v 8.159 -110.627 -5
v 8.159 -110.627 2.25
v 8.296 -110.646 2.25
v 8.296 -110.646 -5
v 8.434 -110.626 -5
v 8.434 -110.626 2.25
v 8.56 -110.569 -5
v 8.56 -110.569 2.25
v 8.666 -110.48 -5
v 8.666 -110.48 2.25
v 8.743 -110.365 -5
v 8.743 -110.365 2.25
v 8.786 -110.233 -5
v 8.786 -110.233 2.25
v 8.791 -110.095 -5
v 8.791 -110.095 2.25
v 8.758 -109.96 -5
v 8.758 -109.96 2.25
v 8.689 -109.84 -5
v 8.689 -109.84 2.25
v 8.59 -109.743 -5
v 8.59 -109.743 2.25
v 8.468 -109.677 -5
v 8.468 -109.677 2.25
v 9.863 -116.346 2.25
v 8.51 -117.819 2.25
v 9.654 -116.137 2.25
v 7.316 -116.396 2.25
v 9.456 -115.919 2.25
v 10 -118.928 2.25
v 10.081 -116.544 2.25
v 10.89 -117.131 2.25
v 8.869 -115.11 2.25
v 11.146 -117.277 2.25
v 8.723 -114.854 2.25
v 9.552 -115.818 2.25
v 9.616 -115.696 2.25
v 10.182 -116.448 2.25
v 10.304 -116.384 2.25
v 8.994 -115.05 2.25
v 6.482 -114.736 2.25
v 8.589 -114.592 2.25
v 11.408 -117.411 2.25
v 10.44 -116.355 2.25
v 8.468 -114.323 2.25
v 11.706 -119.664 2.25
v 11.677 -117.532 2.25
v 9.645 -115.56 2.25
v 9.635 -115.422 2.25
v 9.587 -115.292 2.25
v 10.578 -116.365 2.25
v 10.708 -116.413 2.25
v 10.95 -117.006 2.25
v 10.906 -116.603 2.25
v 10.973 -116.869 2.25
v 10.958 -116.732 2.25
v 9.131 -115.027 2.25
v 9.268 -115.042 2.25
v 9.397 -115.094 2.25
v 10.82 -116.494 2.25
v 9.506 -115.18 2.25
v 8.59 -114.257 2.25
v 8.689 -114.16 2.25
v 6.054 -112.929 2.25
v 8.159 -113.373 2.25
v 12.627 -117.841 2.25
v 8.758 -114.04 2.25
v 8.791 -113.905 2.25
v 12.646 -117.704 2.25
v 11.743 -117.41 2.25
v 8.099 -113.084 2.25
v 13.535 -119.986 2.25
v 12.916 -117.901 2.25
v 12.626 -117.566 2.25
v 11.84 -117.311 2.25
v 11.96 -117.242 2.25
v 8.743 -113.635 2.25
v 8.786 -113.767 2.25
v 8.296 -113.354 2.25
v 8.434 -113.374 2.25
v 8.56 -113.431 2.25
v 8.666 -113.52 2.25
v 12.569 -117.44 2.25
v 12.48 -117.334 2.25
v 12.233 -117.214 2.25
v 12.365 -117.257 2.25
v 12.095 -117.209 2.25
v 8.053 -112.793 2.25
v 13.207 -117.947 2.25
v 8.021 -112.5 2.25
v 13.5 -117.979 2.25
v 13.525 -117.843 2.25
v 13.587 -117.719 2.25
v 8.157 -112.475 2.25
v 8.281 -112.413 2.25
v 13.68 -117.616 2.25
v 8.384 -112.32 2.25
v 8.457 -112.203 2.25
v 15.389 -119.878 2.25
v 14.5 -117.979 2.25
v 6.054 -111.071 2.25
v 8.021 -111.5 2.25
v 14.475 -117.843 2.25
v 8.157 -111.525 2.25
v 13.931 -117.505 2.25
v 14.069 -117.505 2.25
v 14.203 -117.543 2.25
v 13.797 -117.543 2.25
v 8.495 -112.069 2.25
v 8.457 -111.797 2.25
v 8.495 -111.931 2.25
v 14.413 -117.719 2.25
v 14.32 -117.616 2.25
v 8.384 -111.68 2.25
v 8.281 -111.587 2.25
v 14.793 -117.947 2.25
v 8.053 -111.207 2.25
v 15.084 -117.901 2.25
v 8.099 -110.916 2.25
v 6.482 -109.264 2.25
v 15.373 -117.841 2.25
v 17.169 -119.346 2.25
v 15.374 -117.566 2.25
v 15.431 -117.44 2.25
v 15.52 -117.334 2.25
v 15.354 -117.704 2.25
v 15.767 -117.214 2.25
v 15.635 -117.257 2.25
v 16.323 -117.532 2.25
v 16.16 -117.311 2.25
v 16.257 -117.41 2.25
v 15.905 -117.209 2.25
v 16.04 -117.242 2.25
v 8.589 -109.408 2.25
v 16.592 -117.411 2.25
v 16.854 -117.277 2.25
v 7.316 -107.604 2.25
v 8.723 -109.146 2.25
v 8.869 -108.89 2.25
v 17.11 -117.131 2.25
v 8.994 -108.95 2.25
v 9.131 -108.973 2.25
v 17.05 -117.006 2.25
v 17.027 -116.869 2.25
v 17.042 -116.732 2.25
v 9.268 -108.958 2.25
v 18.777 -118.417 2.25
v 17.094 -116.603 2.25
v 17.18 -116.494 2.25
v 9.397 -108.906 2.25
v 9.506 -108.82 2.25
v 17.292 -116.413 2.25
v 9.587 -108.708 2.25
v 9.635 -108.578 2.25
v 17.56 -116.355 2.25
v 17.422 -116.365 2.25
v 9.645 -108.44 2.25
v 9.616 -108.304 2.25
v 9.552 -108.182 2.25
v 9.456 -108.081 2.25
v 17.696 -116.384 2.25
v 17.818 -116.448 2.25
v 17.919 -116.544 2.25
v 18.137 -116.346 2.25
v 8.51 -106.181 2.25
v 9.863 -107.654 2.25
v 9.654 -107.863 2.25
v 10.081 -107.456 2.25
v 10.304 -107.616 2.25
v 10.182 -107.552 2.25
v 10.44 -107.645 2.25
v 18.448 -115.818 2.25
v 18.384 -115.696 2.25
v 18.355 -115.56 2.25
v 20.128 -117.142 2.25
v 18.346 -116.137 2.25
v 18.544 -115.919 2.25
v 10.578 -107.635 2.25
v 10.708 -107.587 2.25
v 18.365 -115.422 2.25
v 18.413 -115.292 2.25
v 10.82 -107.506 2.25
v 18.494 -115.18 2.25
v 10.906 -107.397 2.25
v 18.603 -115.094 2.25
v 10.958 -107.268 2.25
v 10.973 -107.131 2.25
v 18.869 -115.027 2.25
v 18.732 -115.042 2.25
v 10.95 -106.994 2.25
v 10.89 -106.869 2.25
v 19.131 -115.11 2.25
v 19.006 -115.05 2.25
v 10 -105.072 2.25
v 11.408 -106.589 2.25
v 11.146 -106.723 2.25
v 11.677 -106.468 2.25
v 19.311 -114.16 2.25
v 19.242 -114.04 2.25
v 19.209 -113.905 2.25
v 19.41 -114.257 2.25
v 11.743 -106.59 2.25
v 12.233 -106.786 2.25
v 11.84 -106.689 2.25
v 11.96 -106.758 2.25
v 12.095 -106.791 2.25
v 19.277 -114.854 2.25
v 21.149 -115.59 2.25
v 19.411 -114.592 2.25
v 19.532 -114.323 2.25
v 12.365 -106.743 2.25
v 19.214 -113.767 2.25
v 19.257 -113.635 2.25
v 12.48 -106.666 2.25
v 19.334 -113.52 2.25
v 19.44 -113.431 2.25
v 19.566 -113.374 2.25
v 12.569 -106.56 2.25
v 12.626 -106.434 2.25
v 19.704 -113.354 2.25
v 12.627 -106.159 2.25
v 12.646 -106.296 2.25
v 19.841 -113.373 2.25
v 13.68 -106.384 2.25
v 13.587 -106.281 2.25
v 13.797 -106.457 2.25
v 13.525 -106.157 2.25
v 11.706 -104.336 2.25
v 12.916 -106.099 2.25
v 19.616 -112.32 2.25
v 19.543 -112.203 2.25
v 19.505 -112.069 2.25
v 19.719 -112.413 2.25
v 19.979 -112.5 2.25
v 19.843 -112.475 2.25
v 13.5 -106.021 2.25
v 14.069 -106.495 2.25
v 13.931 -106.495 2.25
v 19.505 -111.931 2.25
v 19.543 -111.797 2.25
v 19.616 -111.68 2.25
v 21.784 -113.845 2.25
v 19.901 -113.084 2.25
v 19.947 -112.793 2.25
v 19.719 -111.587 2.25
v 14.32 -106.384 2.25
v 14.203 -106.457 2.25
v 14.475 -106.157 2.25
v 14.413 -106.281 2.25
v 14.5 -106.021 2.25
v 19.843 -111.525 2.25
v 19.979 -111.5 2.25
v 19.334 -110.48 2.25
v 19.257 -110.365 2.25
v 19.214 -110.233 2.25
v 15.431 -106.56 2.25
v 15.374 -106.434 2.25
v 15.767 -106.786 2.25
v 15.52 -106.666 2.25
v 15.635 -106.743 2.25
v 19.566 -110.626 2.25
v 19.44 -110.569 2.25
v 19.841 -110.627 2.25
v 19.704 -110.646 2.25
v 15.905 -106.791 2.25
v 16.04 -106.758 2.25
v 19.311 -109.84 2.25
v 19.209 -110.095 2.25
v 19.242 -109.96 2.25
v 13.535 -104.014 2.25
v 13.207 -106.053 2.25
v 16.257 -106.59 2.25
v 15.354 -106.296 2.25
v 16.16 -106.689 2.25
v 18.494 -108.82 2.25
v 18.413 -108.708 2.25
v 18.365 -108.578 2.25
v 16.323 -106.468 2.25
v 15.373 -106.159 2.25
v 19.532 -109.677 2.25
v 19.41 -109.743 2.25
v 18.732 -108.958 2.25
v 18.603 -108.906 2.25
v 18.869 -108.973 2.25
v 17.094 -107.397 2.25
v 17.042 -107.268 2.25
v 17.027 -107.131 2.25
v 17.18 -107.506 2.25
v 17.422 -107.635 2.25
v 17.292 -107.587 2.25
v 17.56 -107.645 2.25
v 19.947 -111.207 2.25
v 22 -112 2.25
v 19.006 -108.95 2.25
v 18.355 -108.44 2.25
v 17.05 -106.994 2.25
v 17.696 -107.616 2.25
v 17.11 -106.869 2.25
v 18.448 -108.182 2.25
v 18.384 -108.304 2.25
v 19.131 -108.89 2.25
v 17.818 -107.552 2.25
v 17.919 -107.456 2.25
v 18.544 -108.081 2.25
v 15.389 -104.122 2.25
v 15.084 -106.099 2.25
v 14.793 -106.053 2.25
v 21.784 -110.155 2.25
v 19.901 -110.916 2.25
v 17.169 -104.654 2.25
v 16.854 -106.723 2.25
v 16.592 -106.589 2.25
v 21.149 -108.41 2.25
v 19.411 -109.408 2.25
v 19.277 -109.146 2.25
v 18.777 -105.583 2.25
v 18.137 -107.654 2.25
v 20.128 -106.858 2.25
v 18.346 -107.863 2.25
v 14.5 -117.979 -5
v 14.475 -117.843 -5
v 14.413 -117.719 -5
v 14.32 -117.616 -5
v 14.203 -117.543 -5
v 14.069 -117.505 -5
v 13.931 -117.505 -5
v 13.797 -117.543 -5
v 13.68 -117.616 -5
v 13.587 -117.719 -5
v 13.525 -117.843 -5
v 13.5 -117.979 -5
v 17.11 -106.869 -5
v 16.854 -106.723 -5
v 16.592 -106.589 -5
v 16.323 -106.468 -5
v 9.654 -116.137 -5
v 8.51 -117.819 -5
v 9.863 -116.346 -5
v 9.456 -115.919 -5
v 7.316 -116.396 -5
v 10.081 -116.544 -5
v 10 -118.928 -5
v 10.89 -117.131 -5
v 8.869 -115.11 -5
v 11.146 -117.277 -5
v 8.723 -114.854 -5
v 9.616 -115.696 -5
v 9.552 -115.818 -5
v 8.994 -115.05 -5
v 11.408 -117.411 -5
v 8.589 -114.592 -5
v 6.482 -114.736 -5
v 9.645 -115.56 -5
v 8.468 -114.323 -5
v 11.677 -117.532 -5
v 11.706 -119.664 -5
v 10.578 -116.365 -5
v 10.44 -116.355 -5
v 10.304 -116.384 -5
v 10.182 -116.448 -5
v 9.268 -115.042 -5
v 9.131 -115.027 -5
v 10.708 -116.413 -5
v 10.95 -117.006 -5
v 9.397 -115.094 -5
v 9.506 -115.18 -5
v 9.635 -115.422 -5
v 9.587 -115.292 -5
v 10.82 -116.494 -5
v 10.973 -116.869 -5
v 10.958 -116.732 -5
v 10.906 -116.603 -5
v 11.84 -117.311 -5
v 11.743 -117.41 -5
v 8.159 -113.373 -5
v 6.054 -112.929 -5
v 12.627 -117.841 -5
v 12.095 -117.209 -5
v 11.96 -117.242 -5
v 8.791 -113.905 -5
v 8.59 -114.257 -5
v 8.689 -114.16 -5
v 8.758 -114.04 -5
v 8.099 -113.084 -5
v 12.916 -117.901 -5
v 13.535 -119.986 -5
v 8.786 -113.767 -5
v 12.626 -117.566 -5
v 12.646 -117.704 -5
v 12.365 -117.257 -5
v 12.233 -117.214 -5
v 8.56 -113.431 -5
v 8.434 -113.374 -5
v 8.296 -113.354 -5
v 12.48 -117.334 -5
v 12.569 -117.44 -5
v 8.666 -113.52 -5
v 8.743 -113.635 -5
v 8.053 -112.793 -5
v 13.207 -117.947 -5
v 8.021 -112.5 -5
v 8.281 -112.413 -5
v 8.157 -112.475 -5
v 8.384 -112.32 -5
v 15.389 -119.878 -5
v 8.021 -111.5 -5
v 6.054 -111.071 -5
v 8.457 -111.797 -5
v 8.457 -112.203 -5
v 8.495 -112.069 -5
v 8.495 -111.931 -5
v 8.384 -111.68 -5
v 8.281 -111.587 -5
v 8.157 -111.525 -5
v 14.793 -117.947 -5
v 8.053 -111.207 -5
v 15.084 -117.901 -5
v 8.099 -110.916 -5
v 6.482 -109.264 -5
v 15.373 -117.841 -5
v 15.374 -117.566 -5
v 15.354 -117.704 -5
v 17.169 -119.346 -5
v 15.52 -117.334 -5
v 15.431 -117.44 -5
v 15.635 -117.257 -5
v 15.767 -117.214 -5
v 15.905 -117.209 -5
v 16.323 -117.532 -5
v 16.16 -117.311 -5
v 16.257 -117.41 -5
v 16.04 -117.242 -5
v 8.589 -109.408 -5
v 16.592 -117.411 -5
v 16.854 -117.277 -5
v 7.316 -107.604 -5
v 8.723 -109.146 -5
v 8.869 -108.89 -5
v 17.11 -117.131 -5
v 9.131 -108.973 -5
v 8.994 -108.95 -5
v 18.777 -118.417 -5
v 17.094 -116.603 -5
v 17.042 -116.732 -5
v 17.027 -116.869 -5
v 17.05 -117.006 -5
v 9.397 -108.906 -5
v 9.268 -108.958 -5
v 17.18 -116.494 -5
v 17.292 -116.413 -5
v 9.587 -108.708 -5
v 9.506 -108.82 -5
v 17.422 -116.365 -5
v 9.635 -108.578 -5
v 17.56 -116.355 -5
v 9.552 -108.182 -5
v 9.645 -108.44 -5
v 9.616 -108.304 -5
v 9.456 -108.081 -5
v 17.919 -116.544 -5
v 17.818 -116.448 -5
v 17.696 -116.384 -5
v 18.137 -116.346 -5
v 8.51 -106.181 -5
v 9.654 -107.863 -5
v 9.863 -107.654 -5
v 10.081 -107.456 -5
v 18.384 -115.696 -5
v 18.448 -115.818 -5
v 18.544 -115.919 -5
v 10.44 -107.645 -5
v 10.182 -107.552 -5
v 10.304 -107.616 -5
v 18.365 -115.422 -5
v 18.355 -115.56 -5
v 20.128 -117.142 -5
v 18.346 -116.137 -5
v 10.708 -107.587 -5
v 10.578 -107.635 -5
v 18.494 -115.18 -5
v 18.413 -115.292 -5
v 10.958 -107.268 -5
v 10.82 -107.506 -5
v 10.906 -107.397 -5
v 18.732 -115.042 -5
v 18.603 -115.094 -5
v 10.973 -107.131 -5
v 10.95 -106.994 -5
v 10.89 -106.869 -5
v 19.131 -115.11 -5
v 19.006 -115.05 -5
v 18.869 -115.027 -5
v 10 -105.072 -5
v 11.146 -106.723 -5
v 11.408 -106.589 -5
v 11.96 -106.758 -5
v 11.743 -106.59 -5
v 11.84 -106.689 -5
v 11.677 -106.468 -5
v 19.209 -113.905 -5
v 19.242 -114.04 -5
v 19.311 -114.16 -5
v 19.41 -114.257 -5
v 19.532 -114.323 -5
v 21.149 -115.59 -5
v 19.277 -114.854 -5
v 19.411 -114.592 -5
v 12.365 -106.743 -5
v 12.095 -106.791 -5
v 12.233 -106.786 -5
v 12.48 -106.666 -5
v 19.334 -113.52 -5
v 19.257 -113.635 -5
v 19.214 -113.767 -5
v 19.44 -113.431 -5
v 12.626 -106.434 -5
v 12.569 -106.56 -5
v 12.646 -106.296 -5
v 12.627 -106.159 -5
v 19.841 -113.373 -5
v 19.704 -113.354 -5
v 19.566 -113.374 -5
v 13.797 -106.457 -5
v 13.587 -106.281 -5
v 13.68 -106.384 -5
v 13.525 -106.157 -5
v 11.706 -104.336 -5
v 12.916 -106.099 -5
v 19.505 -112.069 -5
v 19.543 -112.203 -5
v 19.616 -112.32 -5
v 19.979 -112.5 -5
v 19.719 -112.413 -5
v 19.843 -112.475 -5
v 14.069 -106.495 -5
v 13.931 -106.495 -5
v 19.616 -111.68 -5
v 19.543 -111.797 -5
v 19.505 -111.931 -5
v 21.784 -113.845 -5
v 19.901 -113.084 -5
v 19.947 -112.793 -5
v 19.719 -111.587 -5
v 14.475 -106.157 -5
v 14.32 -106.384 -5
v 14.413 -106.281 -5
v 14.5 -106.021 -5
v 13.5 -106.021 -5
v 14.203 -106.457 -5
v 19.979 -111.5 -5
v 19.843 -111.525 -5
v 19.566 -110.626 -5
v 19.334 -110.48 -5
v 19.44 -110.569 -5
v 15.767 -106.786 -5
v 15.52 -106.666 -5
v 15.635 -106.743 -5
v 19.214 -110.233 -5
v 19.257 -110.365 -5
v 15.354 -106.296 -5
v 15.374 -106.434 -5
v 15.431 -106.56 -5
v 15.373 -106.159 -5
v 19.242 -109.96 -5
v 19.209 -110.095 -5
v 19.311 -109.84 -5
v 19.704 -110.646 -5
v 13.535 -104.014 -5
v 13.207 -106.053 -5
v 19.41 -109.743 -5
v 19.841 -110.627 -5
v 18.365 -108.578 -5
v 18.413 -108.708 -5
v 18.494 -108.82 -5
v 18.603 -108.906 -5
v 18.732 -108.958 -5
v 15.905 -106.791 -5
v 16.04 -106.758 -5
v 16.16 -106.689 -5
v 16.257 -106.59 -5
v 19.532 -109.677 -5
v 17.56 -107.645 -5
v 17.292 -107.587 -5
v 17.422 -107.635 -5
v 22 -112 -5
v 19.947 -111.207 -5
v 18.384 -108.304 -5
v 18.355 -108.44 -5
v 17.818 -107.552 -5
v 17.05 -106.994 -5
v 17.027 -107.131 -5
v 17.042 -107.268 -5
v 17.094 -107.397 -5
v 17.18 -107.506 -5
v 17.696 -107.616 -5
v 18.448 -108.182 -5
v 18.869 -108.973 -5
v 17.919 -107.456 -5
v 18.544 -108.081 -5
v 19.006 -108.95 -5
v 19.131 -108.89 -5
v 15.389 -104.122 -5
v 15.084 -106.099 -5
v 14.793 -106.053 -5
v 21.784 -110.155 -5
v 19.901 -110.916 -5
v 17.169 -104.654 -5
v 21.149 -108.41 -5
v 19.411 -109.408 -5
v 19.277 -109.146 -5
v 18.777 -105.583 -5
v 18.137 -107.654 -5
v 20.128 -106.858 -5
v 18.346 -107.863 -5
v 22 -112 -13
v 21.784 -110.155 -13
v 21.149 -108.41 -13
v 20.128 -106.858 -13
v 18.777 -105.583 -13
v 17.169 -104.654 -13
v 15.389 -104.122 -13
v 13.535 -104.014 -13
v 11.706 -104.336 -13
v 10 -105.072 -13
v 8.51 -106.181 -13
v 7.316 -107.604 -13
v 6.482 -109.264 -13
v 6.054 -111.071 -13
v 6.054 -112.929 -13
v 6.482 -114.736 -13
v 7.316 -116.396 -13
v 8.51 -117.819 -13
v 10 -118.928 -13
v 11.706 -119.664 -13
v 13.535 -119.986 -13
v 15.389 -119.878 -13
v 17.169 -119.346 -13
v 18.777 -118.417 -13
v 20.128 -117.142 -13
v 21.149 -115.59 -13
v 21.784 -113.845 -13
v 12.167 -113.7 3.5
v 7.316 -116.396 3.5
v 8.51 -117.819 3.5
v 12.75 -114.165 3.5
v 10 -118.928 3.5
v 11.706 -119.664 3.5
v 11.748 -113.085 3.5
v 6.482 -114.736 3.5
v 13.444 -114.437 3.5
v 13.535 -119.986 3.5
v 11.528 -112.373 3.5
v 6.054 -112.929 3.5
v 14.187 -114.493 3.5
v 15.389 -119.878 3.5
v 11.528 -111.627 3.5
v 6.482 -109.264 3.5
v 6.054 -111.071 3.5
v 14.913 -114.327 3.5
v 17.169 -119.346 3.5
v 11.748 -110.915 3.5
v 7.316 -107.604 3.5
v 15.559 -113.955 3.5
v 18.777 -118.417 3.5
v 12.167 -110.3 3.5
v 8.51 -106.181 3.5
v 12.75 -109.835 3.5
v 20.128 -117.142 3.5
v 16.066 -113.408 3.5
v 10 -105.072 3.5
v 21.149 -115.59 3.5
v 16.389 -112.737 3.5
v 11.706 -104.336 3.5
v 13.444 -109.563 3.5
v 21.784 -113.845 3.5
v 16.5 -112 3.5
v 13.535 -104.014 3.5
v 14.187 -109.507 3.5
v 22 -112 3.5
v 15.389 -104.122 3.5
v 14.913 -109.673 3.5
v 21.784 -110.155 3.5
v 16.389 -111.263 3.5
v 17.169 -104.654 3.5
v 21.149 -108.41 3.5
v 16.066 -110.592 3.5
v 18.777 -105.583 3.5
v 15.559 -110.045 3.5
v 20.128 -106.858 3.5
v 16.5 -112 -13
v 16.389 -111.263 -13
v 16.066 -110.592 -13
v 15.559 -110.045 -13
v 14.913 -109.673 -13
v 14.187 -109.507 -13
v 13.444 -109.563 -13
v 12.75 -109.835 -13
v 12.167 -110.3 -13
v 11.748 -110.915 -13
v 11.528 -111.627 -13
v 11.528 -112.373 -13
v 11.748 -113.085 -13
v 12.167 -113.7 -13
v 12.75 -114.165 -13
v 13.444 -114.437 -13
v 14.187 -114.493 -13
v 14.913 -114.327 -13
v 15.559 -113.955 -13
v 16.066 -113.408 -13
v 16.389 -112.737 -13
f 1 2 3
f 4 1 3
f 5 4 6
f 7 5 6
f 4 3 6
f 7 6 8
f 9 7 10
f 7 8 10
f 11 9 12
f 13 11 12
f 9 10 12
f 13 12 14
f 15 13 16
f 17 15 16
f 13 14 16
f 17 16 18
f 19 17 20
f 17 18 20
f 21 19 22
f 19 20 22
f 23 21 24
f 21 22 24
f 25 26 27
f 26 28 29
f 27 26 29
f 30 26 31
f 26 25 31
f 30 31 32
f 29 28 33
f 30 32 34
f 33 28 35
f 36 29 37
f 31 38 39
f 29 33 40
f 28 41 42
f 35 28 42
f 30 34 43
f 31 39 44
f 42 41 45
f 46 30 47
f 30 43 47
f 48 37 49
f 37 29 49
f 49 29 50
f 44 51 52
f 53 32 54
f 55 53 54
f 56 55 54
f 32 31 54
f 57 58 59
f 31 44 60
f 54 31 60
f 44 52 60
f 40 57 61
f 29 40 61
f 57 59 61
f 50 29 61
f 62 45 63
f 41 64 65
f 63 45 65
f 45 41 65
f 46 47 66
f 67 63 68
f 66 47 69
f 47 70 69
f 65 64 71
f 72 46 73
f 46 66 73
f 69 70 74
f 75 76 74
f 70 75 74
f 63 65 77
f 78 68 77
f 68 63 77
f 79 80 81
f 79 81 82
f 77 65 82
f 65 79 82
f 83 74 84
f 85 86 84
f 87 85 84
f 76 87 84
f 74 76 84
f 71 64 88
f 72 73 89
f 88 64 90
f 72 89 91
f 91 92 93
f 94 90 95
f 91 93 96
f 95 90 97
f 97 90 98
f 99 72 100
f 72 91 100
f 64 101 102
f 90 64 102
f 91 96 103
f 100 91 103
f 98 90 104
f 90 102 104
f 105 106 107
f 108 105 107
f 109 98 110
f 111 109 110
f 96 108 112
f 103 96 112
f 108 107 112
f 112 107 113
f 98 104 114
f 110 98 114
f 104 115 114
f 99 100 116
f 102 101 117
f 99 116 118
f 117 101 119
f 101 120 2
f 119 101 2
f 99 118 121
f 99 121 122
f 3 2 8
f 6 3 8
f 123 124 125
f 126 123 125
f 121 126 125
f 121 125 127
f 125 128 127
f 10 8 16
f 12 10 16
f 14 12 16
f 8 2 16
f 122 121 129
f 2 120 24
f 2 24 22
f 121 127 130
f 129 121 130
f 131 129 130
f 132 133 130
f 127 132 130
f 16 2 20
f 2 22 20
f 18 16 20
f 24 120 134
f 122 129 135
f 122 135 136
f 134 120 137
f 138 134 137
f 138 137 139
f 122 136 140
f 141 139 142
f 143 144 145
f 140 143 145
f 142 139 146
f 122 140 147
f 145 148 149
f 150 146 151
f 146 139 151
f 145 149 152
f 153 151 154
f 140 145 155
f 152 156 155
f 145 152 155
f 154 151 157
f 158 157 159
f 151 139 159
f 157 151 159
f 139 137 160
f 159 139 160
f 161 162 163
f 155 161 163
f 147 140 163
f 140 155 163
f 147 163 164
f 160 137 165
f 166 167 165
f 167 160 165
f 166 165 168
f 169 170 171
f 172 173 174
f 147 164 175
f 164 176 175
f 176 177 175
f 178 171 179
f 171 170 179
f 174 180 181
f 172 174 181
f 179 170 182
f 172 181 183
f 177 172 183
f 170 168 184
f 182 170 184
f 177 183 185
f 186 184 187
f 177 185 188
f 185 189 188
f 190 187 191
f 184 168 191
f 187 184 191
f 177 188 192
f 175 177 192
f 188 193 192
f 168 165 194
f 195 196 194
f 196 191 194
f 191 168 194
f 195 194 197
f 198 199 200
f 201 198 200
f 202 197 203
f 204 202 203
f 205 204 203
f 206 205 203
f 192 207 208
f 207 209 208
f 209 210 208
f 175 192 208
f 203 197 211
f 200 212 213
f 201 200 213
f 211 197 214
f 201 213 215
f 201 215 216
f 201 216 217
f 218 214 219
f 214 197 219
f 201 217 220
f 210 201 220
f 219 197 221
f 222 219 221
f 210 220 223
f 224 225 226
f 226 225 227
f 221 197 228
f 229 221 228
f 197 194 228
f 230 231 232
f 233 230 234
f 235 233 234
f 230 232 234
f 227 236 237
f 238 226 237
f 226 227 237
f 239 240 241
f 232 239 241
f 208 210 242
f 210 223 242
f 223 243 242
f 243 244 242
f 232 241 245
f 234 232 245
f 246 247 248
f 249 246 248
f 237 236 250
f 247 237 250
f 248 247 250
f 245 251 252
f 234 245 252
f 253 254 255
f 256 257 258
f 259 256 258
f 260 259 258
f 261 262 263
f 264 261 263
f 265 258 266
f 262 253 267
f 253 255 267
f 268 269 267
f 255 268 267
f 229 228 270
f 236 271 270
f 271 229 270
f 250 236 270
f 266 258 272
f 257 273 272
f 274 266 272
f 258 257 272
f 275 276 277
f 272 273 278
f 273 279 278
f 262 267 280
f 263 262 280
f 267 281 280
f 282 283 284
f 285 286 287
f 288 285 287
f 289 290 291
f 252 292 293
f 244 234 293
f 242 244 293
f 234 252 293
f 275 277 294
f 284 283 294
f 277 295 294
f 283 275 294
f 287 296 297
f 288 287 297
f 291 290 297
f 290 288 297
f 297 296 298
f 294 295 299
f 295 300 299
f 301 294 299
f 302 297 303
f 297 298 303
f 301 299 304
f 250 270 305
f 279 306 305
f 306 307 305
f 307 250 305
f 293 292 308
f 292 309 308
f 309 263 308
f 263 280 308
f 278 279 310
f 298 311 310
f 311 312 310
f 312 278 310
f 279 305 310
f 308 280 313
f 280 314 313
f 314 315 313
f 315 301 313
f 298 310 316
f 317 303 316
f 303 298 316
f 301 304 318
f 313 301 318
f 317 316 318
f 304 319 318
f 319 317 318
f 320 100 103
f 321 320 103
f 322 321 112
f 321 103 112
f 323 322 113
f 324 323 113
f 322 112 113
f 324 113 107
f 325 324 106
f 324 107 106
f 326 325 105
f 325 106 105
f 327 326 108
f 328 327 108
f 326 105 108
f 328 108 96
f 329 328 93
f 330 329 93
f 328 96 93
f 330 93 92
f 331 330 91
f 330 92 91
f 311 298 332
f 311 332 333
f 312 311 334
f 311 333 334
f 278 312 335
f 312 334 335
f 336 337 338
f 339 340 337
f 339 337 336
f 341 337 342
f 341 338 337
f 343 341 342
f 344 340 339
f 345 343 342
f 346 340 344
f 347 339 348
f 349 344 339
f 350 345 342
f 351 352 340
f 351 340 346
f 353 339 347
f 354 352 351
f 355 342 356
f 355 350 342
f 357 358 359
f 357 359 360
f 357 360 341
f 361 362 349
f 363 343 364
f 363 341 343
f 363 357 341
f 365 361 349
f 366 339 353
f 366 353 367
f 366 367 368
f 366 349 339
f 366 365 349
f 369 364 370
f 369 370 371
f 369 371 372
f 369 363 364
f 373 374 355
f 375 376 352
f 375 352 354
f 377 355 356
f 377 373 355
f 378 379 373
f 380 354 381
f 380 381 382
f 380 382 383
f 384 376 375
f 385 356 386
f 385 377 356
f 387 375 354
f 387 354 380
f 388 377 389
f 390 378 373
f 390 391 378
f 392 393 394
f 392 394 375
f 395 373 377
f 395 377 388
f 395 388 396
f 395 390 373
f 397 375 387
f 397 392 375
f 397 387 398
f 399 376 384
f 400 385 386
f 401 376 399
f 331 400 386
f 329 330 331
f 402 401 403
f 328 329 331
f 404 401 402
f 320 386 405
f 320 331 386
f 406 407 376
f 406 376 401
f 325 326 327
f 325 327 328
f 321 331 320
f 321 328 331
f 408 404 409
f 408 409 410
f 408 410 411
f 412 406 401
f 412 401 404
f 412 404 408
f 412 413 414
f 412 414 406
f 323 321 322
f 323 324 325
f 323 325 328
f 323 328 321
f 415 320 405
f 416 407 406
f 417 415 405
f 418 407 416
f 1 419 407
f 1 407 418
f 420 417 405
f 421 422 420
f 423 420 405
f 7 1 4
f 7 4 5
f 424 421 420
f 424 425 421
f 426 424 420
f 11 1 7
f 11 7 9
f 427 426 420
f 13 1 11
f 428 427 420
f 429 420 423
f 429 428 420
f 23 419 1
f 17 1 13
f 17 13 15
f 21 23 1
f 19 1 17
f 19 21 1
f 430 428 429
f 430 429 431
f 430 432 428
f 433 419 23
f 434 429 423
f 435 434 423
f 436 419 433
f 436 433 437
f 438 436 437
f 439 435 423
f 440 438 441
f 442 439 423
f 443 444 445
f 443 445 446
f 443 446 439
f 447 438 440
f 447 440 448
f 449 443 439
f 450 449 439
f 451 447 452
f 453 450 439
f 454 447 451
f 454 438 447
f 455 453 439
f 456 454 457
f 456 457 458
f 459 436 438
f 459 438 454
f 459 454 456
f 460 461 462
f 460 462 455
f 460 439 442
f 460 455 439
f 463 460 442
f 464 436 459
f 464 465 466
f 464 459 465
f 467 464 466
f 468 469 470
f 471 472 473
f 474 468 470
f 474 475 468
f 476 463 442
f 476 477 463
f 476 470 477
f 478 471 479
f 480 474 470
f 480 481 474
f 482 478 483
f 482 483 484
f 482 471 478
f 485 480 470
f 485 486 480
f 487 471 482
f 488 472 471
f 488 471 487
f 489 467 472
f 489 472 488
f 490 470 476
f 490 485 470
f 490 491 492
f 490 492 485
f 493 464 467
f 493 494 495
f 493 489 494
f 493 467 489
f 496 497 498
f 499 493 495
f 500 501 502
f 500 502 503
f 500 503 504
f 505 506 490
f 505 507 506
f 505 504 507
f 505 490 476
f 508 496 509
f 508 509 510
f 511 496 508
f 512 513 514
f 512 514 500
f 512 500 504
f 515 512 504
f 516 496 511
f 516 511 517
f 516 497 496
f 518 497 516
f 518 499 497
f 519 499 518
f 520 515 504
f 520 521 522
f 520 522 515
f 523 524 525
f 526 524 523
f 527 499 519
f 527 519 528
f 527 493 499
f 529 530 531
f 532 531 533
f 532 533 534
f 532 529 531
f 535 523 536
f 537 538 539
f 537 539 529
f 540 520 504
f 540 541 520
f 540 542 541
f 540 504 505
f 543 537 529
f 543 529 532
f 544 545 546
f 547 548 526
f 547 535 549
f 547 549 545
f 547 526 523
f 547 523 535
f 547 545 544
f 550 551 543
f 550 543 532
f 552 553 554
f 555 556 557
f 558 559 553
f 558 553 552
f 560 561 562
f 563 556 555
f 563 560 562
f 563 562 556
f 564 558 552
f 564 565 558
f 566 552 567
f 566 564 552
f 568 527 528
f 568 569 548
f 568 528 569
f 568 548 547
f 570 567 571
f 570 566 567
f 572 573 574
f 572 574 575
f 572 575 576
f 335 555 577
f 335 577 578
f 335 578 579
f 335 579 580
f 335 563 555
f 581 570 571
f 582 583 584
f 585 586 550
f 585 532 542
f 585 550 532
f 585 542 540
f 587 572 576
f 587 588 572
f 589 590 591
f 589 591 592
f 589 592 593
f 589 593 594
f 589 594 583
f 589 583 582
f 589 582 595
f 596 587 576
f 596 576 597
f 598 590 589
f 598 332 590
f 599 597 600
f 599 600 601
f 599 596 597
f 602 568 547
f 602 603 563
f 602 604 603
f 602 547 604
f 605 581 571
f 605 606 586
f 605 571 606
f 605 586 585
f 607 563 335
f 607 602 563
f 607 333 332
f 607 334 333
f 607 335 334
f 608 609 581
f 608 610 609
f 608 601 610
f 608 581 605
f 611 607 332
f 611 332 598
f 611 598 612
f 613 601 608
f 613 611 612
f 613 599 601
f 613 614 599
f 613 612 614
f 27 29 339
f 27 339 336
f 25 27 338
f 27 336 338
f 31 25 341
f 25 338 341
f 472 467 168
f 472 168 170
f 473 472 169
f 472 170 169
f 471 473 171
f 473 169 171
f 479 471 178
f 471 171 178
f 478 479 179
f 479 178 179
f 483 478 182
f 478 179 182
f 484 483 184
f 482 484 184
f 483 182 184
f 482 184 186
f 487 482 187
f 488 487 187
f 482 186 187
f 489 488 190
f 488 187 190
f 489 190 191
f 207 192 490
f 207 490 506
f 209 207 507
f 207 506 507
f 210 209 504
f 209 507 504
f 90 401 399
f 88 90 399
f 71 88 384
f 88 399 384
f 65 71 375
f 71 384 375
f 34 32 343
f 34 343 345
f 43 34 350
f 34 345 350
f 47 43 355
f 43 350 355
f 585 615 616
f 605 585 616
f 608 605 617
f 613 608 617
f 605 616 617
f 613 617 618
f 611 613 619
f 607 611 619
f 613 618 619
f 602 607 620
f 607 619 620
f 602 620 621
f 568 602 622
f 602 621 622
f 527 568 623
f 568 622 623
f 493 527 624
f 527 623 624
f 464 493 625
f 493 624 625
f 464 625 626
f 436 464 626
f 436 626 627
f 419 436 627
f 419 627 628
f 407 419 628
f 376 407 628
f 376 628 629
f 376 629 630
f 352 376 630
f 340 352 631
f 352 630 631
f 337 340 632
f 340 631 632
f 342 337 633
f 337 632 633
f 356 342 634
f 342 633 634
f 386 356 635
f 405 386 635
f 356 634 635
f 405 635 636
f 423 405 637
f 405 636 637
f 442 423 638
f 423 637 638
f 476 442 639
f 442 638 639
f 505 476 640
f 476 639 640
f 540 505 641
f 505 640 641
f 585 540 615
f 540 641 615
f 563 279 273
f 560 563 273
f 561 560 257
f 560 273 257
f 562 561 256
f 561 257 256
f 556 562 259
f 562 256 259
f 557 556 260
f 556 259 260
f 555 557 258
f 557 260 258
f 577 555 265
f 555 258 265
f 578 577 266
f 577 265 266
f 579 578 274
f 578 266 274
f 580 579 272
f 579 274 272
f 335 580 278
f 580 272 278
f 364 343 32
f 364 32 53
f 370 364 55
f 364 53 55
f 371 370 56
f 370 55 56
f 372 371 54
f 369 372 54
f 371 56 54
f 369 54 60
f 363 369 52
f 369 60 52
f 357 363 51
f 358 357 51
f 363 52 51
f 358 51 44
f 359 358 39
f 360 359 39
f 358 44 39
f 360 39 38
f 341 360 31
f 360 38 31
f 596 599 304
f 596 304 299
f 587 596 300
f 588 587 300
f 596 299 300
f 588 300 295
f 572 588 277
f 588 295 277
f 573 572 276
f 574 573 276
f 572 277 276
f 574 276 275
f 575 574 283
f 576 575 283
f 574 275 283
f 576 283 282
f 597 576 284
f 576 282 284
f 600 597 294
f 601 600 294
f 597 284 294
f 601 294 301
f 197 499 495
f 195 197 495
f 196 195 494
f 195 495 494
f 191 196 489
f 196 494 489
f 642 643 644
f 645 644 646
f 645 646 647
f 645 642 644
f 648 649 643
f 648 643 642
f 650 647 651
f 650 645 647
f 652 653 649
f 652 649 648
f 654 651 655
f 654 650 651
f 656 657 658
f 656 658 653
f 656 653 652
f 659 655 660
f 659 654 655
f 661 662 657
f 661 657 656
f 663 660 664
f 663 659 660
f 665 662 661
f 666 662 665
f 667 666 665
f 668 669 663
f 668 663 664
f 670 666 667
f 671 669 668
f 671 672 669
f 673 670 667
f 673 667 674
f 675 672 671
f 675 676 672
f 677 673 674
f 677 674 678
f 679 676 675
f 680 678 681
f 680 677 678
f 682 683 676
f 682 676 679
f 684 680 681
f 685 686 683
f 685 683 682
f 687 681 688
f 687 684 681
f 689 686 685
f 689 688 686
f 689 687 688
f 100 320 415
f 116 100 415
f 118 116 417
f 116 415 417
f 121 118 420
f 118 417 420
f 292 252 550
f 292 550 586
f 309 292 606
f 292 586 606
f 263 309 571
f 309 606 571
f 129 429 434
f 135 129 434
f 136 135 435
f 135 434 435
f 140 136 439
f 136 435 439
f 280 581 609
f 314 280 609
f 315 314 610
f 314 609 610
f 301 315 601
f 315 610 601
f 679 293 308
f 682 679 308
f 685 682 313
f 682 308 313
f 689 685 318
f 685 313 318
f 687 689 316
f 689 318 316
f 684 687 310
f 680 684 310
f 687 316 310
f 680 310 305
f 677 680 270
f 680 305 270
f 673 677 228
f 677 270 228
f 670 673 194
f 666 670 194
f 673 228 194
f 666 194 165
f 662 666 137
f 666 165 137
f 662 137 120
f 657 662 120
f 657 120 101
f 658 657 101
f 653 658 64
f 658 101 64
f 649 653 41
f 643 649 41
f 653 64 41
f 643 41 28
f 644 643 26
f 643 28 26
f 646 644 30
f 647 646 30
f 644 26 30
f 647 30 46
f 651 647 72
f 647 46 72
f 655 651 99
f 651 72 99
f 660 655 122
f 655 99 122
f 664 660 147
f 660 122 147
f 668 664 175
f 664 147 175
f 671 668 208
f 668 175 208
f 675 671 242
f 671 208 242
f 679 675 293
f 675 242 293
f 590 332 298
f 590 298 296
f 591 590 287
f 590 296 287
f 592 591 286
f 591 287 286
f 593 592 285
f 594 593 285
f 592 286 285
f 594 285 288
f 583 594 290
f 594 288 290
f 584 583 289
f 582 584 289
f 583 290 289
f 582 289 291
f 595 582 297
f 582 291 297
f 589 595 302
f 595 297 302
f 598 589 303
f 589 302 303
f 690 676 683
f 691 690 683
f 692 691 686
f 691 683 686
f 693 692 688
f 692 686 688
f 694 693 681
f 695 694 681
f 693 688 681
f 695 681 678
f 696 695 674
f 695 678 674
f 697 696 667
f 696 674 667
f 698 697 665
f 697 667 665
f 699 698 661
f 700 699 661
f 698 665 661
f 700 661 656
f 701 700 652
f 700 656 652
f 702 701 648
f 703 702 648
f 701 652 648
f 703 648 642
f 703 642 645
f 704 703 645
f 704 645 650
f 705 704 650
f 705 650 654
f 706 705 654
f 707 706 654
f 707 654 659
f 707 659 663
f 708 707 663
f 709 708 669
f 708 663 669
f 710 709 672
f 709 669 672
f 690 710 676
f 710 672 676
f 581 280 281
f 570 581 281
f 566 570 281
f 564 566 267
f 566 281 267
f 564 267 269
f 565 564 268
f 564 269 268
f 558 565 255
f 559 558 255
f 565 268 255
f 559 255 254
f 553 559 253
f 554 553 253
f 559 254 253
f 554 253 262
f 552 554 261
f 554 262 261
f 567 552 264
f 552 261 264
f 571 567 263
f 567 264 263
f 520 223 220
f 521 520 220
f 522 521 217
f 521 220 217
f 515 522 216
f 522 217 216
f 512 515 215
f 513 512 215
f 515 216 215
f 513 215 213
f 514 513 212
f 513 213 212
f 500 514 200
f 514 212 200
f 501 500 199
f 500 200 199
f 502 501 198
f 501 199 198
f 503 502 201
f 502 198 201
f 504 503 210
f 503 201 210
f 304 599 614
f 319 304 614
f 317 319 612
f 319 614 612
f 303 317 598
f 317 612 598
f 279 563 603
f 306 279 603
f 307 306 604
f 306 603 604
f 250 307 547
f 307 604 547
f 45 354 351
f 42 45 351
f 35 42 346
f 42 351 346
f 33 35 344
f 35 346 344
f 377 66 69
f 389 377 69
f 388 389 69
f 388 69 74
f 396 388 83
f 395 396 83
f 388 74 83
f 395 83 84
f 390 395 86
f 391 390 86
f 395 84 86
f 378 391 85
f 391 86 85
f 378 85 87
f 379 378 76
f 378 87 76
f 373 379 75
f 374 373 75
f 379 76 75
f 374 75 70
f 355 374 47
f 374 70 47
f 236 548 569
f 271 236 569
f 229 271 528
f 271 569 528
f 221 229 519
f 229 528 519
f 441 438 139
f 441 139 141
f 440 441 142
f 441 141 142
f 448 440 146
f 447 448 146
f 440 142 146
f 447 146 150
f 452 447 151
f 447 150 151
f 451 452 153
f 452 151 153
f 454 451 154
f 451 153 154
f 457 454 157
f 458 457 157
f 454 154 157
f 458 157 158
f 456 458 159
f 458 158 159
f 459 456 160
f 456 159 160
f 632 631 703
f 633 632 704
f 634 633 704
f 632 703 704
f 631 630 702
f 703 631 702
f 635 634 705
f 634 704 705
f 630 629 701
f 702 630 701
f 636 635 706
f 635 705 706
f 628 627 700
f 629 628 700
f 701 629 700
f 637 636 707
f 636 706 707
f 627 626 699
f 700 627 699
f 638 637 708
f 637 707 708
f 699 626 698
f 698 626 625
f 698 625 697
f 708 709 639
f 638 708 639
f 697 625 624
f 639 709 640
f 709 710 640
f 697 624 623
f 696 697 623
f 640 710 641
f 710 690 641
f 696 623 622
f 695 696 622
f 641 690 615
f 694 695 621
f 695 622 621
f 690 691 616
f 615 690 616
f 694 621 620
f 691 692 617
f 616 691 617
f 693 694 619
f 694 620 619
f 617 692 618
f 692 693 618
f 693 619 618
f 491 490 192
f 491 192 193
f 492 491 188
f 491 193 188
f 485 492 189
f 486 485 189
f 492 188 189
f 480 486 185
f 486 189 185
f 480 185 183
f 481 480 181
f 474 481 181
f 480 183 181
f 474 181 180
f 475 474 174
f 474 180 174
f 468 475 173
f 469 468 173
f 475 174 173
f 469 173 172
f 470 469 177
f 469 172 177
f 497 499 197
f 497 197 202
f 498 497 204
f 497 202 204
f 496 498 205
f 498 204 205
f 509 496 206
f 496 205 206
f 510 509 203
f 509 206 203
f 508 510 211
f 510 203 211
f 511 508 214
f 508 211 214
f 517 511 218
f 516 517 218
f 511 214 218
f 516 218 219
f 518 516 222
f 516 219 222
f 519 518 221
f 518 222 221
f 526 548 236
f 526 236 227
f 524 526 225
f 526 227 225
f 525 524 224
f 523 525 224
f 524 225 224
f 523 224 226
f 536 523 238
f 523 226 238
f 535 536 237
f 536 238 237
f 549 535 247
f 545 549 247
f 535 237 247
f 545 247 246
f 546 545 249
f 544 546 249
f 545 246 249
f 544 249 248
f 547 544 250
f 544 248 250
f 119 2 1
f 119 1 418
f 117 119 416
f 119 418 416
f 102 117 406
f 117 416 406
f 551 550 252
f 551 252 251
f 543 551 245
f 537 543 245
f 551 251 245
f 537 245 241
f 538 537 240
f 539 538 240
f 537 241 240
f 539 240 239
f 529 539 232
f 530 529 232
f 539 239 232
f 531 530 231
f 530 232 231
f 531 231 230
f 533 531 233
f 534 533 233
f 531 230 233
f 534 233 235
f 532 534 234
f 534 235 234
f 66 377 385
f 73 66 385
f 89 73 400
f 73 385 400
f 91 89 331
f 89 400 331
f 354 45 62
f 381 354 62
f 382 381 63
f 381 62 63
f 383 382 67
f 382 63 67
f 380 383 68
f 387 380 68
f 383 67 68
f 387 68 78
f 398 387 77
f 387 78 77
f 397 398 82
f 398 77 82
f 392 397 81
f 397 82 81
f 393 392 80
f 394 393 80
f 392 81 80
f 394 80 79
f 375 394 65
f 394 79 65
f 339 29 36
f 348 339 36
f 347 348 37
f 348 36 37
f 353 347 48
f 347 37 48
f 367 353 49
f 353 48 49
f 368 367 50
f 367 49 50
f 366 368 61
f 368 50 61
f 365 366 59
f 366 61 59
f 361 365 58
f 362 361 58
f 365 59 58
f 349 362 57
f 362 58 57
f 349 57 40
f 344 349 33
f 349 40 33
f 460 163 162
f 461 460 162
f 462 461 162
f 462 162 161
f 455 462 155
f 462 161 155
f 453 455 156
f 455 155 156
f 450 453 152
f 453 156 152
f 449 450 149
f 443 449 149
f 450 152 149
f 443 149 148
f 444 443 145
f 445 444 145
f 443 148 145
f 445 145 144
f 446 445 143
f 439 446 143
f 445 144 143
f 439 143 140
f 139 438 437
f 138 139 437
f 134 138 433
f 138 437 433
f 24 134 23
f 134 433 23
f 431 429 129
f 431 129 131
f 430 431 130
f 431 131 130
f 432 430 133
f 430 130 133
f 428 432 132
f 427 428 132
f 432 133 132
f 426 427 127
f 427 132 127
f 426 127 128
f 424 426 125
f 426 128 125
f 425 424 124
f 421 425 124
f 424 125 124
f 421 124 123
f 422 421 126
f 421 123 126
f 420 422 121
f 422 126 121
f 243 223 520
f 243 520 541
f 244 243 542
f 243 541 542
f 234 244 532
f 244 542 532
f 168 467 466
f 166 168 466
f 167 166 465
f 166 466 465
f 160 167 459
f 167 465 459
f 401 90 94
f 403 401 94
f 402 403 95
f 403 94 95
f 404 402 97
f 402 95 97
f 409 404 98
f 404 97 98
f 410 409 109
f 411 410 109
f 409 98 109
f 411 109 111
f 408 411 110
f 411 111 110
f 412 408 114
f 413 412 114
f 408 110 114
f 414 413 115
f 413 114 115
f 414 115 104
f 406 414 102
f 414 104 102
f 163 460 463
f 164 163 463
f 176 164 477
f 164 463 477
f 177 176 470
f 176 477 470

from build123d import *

# Parameters (mm, degrees)
SKETCH025_R              = 8
PAD014_DEPTH             = 8
SKETCH026_R              = 6
PAD015_DEPTH             = 7.25
SKETCH027_R              = 0.5
POCKET008_DEPTH          = 7.25
POLARPATTERN_COUNT       = 20
SKETCH028_R              = 8
PAD016_DEPTH             = 1.25
SKETCH029_R              = 2.5
POCKET009_DEPTH          = 16.5
CLONE005_PLACEMENT_ANGLE = 180


with BuildPart() as part:
    # Sketch025 → Pad014 (new body)
    with BuildSketch(Plane(origin=(20, -80, 0), x_dir=(1, 0, 0), z_dir=(0, 0, -1))):
        Circle(SKETCH025_R)
    extrude(amount=PAD014_DEPTH)

    # Sketch026 → Pad015 (new body)
    with BuildSketch(Plane(origin=(20, -80, -8), x_dir=(1, 0, 0), z_dir=(0, 0, -1))):
        Circle(SKETCH026_R)
    extrude(amount=PAD015_DEPTH)

    # Sketch027 → Pocket008 (cut)
    with BuildSketch(Plane(origin=(20, -80, -15.25), x_dir=(1, 0, 0), z_dir=(0, 0, -1))):
        with Locations((6, 0)):
            Circle(SKETCH027_R)
    pocket008 = extrude(amount=-POCKET008_DEPTH, mode=Mode.SUBTRACT)

    # PolarPattern: Pocket008 ×20 about axis
    polarpattern_axis = Axis((20, -80, -15.25), (0, 0, -1))
    for i in range(1, POLARPATTERN_COUNT):
        add(pocket008.rotate(polarpattern_axis, i * 360 / POLARPATTERN_COUNT), mode=Mode.SUBTRACT)

    # Sketch028 → Pad016 (new body)
    with BuildSketch(Plane(origin=(20, -80, -15.25), x_dir=(1, 0, 0), z_dir=(0, 0, -1))):
        Circle(SKETCH028_R)
    extrude(amount=PAD016_DEPTH)

    # Sketch029 → Pocket009 (cut)
    with BuildSketch(Plane(origin=(20, -80, -16.5), x_dir=(1, 0, 0), z_dir=(0, 0, -1))):
        Circle(SKETCH029_R)
    extrude(amount=-POCKET009_DEPTH, mode=Mode.SUBTRACT)


with BuildPart() as part_1:
    # Clone005 placement: moved
    add(part.part.moved(Location((-6, -192, -13))).rotate(Axis((-6, -192, -13), (-1, 0, 0)), CLONE005_PLACEMENT_ANGLE))


solid = part_1.part
